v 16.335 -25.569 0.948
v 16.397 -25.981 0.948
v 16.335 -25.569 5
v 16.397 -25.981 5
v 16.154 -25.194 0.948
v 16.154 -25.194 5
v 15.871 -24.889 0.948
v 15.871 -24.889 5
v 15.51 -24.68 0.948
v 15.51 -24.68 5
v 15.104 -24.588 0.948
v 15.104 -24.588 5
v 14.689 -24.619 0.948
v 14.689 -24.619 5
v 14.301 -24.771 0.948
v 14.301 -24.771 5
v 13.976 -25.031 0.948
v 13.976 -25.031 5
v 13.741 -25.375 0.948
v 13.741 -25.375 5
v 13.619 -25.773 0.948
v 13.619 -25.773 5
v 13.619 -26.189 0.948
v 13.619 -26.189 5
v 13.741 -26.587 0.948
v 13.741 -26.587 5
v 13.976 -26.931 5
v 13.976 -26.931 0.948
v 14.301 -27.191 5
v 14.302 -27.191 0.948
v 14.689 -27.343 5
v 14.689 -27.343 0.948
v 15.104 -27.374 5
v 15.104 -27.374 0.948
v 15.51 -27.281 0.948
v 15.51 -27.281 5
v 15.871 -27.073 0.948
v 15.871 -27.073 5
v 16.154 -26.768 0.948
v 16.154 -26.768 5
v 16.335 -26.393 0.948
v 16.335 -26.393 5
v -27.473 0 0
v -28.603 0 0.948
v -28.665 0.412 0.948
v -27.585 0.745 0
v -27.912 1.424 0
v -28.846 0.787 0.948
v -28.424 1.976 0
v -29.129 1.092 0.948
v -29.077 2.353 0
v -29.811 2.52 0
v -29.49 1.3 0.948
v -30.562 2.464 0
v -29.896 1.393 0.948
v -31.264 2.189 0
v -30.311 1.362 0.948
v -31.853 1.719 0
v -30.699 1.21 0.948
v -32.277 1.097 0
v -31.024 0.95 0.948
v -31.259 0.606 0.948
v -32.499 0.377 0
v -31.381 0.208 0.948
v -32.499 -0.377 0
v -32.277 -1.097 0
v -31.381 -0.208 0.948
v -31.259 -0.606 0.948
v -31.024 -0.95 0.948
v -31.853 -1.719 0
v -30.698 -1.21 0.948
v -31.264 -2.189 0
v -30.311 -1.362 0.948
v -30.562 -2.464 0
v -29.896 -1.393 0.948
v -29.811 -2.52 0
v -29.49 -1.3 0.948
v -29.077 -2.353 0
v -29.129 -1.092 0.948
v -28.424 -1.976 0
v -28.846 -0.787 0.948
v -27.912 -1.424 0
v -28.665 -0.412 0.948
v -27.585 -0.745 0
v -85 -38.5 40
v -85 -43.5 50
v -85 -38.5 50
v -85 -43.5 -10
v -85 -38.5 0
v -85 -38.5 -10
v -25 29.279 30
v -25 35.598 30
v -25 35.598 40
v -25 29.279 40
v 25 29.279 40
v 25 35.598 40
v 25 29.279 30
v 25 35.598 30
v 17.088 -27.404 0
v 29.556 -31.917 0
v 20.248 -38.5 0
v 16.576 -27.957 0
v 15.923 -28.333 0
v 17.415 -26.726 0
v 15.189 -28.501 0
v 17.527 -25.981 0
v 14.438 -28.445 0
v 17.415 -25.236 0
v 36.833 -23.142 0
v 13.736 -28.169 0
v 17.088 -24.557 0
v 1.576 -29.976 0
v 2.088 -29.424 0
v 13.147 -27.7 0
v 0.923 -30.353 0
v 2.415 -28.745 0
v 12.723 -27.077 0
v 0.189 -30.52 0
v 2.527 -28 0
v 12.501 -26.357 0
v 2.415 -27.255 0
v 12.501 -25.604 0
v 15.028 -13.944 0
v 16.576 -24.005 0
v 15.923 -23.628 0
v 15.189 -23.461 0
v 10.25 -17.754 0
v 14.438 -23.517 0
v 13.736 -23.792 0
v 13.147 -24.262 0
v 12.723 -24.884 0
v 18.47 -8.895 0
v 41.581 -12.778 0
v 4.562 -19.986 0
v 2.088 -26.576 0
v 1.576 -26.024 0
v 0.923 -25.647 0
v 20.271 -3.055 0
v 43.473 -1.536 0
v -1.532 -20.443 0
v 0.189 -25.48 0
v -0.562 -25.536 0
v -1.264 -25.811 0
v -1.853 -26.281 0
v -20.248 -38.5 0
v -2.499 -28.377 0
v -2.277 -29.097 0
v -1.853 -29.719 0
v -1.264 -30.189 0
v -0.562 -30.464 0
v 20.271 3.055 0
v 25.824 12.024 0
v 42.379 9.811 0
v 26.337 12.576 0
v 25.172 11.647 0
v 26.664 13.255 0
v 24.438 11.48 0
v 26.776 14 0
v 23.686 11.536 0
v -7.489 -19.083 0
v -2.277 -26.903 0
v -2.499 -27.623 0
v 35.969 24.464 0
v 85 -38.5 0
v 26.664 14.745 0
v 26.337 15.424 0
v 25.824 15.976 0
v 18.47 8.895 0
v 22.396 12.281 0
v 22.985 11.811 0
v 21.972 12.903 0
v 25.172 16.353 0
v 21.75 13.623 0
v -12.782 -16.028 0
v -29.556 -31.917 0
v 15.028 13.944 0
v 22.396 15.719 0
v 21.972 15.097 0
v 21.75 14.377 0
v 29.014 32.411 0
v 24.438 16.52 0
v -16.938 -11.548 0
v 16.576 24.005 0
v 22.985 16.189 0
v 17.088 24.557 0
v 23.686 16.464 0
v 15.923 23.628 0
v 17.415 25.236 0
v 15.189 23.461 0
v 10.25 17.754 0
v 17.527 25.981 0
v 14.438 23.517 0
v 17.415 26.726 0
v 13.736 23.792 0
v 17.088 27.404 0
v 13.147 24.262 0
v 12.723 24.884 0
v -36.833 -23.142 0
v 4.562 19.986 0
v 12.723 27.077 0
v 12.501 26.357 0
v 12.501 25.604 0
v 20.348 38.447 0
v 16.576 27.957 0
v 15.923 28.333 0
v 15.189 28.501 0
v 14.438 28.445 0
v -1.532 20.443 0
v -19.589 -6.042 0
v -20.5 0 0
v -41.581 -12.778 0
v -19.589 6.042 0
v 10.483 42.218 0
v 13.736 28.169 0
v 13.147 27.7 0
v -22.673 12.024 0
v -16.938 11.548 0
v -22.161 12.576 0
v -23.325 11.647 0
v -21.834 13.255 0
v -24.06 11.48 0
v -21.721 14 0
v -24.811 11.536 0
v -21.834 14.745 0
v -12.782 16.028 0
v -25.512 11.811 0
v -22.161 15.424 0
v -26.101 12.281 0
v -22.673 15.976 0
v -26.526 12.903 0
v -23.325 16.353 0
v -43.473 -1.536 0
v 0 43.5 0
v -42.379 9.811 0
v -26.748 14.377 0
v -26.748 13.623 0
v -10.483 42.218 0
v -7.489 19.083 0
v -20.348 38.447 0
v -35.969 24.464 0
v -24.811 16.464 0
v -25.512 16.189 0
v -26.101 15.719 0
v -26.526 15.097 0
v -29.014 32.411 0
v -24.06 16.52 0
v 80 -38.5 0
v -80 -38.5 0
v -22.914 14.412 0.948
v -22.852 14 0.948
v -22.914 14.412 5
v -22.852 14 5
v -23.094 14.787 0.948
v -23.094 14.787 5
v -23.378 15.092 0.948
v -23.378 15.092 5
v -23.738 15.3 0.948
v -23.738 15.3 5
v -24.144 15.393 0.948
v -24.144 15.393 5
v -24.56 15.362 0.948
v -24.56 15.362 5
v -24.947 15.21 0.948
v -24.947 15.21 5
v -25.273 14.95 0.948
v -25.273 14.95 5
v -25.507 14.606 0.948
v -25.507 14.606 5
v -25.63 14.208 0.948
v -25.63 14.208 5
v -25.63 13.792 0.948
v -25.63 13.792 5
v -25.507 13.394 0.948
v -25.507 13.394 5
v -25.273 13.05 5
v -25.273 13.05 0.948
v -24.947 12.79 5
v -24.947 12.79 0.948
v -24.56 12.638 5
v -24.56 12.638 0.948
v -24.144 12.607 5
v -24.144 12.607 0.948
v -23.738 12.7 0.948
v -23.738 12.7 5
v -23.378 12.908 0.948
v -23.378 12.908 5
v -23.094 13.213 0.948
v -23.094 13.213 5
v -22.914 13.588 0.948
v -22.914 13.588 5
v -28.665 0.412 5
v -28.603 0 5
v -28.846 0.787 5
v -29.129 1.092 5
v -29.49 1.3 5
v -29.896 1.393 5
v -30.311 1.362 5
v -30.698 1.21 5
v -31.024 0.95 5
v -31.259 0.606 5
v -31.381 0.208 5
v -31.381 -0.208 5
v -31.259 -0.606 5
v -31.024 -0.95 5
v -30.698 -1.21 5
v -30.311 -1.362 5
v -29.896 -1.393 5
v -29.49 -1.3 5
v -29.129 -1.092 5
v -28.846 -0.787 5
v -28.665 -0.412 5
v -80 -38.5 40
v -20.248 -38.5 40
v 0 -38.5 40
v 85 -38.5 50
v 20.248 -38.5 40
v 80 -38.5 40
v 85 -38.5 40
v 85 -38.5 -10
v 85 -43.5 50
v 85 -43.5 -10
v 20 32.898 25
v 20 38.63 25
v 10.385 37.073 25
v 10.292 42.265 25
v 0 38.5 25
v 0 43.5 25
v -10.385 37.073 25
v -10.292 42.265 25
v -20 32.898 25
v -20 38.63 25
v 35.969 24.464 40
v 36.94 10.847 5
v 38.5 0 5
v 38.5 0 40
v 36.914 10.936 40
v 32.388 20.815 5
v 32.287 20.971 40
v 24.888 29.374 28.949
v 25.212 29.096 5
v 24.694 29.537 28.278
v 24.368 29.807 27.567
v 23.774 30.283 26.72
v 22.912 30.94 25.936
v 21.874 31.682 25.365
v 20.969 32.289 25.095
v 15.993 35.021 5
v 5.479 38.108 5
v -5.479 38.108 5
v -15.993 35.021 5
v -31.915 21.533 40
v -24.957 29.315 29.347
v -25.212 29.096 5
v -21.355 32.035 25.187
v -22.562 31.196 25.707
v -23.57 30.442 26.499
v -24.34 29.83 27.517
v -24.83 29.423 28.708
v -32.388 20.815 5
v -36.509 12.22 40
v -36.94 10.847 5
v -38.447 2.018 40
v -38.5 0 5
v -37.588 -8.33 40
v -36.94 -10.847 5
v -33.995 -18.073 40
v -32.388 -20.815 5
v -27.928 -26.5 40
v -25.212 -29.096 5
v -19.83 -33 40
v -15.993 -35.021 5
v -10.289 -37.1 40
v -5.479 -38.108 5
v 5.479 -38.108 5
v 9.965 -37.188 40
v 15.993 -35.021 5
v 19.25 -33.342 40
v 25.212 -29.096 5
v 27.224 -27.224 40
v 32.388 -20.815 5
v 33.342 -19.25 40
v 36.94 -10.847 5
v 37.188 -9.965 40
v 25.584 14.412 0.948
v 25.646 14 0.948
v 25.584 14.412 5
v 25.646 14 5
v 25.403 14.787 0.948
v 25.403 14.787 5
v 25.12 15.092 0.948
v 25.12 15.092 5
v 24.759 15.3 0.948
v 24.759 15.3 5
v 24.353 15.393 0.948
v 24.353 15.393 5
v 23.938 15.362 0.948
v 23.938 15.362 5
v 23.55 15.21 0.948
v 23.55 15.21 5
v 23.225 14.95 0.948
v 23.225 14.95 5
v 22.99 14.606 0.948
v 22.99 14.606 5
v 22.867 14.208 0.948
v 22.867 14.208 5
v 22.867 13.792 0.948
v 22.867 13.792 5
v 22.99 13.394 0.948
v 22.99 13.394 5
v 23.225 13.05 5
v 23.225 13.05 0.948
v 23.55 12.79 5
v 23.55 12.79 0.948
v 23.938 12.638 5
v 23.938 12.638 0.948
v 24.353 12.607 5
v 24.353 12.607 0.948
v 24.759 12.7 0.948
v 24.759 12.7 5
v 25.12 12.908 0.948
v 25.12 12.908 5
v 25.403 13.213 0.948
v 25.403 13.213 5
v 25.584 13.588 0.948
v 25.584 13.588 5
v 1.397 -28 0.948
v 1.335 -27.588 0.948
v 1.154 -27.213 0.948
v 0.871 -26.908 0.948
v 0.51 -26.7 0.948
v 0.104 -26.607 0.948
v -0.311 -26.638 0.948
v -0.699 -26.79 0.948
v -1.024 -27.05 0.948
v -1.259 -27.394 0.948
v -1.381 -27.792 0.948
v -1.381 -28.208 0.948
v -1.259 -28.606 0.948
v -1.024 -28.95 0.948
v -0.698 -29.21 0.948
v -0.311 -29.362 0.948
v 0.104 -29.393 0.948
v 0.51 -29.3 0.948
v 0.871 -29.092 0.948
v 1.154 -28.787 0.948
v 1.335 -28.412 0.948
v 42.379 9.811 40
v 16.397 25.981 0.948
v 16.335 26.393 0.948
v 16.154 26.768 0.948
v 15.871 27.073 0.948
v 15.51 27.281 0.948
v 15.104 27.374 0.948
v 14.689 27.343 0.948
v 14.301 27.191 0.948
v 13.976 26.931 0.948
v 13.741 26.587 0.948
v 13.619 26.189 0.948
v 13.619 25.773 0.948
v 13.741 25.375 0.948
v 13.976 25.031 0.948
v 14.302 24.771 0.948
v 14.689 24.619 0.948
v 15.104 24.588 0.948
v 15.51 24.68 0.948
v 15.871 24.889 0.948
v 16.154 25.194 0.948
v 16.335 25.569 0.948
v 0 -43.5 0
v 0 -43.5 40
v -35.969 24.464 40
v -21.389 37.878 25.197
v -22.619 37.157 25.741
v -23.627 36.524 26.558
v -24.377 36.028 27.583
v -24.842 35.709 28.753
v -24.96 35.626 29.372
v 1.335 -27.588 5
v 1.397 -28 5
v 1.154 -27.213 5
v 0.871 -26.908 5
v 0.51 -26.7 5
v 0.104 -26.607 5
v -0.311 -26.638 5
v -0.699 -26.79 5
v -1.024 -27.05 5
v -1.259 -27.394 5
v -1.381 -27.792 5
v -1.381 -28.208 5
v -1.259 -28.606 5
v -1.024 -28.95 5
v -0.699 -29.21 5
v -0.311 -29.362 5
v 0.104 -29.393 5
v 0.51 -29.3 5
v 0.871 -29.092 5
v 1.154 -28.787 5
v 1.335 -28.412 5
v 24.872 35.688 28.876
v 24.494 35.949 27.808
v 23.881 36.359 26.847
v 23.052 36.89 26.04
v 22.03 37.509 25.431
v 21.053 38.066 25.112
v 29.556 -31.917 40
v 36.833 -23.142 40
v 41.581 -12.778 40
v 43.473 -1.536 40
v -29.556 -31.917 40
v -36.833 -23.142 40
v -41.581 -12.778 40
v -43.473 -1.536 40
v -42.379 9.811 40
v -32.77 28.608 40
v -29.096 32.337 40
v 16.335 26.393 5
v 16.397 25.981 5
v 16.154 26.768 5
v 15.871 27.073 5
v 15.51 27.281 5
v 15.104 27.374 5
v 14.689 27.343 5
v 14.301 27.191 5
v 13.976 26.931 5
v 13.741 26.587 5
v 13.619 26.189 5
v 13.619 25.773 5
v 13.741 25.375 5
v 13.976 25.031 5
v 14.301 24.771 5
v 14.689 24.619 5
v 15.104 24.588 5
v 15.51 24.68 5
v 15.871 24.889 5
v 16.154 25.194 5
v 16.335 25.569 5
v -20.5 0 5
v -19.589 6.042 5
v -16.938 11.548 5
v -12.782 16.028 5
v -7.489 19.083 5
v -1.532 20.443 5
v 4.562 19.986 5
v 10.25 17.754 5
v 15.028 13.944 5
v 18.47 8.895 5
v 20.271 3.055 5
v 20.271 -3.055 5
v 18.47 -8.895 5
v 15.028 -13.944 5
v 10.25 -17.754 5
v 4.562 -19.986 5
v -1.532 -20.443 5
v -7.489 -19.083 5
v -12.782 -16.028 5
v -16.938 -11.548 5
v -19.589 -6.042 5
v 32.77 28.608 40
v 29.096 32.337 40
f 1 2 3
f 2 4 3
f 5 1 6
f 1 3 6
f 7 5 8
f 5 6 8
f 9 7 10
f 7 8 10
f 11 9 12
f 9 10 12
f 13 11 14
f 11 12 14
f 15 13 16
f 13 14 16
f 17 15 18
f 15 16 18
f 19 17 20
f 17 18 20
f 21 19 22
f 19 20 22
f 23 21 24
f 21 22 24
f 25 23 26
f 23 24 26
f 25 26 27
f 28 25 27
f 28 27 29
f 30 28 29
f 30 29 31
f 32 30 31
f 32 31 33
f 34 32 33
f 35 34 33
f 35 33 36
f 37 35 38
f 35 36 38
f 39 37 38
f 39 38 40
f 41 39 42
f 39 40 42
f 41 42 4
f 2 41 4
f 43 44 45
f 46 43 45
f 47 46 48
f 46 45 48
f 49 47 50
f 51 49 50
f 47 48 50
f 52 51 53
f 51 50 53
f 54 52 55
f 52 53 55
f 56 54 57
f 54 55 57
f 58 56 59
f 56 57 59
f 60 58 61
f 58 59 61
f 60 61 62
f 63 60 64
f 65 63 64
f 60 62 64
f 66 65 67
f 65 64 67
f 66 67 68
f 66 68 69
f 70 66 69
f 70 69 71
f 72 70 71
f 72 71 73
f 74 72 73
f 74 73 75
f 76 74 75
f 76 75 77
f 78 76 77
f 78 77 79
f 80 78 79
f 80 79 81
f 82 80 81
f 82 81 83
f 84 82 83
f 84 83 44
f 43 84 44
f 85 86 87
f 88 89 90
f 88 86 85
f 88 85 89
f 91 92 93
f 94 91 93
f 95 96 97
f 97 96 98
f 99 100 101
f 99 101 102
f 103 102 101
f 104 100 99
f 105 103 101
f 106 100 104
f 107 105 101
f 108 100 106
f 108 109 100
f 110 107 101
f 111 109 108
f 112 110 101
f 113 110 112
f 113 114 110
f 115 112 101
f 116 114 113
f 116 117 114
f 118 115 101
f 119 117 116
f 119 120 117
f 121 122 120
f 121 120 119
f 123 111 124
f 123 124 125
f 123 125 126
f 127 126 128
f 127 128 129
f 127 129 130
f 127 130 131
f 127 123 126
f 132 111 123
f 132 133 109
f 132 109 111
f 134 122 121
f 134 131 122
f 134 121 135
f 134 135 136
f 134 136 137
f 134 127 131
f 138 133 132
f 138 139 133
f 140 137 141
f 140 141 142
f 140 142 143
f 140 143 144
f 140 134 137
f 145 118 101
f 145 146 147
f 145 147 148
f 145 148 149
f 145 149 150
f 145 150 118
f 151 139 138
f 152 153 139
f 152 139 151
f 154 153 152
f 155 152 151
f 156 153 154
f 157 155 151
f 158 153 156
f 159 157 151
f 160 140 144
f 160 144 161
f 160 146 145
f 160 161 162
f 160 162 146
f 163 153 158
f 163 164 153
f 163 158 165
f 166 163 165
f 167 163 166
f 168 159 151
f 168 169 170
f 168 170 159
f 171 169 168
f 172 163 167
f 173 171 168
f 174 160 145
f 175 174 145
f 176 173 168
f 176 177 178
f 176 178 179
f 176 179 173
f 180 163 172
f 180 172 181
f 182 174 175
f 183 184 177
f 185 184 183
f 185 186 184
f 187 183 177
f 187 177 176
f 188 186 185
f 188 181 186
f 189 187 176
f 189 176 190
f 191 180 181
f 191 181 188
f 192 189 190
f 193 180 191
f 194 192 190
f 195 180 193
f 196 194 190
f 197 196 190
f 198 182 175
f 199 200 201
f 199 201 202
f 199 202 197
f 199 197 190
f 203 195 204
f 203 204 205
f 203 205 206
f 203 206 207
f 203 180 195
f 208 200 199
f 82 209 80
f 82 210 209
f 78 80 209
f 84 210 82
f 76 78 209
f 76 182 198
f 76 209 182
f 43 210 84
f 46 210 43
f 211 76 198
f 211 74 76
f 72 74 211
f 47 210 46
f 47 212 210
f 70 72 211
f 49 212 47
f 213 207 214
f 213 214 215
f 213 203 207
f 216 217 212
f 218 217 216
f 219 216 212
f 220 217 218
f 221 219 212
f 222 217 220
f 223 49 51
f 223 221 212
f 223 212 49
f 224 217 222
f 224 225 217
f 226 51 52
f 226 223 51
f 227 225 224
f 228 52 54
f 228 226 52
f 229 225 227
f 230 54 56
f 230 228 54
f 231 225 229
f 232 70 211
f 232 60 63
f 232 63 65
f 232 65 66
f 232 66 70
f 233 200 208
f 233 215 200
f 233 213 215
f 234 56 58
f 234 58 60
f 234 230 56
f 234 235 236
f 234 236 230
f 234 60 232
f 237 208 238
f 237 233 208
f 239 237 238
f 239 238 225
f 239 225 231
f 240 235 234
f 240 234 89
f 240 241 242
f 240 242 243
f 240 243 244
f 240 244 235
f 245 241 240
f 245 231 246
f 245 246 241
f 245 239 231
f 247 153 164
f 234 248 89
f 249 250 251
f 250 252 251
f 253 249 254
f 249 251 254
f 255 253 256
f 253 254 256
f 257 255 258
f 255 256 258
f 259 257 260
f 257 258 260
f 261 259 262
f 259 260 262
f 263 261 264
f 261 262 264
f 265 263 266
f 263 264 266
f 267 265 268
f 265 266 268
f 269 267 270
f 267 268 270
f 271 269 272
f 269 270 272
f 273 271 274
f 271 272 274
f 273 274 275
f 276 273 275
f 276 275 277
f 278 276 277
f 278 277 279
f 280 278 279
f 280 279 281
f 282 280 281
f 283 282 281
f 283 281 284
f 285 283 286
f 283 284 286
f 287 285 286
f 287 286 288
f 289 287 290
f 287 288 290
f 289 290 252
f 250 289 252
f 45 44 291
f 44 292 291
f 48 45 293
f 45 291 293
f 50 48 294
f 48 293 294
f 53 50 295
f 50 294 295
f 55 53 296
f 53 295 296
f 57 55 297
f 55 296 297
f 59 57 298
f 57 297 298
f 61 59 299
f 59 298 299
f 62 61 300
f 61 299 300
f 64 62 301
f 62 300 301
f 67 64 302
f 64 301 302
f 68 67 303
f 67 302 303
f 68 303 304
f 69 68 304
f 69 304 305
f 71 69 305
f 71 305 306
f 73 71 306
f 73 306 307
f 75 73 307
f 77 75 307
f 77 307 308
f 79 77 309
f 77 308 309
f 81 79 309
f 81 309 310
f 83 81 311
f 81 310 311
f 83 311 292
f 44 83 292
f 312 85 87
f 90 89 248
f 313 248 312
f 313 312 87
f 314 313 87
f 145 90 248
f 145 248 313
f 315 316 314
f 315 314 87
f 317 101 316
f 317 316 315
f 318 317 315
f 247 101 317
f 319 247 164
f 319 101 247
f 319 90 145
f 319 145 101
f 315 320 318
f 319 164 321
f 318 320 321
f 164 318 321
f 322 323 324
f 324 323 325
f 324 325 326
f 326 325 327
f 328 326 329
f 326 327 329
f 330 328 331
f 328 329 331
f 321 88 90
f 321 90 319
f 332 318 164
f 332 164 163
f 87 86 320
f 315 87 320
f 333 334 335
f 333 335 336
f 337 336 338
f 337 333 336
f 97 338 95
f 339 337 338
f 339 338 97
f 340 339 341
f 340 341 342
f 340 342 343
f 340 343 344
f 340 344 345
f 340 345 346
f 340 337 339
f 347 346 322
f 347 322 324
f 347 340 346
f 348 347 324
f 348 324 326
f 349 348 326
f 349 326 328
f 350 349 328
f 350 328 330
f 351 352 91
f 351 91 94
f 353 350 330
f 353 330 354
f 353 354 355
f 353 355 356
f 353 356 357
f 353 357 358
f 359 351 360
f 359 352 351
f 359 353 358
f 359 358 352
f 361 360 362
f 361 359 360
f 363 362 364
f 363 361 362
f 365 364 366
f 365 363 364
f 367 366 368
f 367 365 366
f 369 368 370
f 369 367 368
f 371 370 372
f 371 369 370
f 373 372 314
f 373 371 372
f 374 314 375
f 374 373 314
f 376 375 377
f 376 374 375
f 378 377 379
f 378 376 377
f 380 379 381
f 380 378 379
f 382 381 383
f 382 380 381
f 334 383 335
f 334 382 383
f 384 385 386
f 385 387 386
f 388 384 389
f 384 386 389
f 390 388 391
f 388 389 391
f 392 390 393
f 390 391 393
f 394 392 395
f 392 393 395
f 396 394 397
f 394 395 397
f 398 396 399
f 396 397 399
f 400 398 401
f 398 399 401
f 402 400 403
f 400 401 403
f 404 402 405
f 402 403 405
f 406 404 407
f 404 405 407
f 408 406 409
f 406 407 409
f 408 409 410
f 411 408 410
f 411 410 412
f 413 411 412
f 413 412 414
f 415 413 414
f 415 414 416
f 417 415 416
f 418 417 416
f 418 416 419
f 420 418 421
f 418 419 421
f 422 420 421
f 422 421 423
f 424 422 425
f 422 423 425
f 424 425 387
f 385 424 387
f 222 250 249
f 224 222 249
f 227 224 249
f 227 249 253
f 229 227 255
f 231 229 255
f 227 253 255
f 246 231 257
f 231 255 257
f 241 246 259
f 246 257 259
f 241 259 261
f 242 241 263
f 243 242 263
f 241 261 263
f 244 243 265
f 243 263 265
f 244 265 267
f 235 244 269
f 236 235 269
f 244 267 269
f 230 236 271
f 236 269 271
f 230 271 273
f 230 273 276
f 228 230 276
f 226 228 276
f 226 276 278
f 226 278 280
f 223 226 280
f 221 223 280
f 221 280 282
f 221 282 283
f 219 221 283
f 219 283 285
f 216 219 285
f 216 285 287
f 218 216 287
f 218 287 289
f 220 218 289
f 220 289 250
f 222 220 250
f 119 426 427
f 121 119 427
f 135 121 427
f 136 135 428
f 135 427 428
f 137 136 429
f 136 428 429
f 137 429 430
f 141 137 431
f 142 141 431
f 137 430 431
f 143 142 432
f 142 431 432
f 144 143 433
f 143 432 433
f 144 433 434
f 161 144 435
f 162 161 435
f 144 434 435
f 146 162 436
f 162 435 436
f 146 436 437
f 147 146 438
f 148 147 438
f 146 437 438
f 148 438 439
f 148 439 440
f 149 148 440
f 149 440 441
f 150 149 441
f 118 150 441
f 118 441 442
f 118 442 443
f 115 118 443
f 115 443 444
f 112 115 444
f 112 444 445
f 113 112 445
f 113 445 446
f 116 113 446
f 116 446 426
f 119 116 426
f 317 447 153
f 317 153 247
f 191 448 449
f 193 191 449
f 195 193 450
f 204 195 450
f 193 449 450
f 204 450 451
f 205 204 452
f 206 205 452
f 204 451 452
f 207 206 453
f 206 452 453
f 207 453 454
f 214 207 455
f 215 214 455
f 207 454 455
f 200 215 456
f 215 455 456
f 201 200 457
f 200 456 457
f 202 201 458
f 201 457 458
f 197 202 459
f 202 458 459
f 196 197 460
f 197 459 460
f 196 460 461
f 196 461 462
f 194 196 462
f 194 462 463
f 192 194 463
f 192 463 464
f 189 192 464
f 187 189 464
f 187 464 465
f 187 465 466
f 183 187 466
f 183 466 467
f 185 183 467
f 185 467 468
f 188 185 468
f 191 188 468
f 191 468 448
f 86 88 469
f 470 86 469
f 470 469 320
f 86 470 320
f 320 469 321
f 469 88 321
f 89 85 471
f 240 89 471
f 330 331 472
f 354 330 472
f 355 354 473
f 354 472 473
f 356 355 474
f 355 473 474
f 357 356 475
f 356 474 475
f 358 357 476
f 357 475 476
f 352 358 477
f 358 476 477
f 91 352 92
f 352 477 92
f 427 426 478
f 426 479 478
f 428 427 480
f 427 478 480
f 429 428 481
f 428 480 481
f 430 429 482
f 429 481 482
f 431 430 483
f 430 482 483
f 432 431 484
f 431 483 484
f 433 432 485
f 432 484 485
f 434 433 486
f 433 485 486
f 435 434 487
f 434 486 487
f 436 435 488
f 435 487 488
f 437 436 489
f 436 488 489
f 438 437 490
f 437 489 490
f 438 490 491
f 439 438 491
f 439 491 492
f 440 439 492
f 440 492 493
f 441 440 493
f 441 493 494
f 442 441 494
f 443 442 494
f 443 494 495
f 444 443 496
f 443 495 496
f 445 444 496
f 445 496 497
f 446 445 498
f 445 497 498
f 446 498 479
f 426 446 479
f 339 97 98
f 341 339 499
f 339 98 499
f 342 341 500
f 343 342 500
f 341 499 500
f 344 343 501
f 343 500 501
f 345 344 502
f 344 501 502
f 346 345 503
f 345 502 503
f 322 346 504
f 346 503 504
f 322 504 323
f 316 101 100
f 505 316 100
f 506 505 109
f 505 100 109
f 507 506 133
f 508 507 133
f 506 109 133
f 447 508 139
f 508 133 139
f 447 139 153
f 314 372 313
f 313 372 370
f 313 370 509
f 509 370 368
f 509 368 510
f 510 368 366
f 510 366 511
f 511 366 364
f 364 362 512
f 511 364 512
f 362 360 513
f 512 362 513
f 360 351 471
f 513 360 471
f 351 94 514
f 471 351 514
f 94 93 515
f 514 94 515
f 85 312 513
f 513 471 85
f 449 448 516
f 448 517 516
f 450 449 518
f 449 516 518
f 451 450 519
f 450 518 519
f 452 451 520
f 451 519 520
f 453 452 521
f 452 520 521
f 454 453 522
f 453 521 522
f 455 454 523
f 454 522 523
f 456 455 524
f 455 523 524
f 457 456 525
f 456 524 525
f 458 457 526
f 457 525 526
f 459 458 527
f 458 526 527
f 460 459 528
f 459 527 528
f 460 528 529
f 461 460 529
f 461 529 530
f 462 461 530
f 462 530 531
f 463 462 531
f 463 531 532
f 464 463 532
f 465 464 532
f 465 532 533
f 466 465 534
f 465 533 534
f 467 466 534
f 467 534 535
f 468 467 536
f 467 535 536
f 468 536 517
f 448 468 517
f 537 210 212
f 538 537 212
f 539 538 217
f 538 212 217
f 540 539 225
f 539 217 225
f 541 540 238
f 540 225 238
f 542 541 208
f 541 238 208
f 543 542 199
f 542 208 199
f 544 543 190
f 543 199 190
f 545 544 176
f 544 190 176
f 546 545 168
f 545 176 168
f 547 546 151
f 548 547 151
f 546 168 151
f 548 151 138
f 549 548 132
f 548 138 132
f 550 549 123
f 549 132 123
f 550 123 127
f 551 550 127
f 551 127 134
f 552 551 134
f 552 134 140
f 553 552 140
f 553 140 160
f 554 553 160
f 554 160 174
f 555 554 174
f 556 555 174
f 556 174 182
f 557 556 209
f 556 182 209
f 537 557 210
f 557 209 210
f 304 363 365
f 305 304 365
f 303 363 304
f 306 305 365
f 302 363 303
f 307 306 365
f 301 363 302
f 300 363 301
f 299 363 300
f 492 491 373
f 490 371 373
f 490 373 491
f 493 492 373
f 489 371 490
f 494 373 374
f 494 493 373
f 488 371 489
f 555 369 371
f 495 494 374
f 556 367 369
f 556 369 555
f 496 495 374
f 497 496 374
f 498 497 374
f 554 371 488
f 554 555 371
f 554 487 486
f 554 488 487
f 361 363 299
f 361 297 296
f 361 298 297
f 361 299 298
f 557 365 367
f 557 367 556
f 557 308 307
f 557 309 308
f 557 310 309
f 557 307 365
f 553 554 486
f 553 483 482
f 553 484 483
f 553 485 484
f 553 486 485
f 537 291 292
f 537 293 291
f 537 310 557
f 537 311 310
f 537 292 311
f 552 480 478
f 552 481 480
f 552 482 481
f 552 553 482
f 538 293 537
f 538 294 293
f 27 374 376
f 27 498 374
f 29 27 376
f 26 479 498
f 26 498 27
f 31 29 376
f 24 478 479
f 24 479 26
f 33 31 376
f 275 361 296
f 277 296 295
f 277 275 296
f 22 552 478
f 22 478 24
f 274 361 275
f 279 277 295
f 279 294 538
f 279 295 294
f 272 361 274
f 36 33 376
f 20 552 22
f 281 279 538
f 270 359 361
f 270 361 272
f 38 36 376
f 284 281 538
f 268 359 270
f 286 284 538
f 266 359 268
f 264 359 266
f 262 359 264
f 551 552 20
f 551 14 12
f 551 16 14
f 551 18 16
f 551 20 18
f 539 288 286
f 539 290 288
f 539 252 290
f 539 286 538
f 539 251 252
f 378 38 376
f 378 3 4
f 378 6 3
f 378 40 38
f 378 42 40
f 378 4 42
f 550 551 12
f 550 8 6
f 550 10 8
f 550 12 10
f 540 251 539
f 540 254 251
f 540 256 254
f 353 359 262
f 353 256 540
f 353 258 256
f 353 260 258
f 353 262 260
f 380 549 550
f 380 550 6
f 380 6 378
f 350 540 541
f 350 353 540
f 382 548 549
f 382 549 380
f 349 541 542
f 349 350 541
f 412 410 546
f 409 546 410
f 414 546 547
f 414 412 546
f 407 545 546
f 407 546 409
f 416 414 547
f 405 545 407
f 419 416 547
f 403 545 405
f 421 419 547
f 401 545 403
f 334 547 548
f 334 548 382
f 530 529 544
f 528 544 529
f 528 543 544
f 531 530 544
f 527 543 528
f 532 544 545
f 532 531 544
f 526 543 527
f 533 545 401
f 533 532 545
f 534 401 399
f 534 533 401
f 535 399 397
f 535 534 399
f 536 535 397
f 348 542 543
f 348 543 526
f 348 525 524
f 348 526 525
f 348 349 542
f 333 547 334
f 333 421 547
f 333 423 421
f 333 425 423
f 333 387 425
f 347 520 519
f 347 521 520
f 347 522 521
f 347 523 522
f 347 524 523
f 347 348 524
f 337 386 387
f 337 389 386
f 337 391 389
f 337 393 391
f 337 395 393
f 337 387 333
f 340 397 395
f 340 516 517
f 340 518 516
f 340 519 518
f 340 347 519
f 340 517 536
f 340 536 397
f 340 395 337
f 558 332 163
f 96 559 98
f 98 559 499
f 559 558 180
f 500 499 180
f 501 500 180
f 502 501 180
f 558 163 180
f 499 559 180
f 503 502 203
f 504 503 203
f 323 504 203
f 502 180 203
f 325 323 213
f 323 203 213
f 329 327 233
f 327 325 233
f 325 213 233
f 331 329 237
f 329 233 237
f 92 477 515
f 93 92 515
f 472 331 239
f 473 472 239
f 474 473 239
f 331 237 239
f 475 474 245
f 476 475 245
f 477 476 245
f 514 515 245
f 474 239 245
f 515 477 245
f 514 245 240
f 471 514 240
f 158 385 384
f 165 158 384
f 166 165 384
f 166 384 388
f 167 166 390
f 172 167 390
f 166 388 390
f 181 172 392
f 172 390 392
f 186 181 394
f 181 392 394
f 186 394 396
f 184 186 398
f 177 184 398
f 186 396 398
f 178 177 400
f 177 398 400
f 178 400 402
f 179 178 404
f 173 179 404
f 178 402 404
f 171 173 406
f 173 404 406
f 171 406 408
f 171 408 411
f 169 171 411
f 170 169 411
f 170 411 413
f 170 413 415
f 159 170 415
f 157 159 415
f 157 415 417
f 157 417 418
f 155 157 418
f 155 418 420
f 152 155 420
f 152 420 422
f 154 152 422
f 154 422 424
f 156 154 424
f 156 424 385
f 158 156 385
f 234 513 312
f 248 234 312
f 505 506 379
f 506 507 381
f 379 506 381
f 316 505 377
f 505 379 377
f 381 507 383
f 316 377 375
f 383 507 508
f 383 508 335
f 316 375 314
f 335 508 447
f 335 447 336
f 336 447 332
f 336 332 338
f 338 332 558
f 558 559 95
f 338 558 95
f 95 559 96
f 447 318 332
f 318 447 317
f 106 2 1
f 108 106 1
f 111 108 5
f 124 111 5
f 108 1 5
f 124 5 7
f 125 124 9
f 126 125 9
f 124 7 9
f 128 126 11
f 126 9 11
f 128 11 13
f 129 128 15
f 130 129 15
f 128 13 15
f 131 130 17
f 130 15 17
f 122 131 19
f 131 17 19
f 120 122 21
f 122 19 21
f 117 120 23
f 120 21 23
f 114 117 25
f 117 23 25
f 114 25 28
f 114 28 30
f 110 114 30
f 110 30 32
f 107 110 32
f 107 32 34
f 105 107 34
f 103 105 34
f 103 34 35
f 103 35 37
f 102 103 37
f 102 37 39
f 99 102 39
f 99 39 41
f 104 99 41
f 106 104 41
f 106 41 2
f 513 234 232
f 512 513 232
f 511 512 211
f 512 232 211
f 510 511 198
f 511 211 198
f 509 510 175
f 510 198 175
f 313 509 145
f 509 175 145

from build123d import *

# Parameters (mm, degrees)
SKETCH17_R                                        = 43.5
BOSS_EXTRUDE1_DEPTH                               = 5
SKETCH19_R                                        = 43.5
SKETCH19_R_2                                      = 38.5
BOSS_EXTRUDE2_DEPTH                               = 35
SKETCH20_R                                        = 20.5
CUT_EXTRUDE1_DEPTH                                = 5
SKETCH26_W                                        = 170
SKETCH26_H                                        = 60
BOSS_EXTRUDE3_DEPTH                               = 5
BOSS_EXTRUDE4_DEPTH                               = 40
CSK_FOR_3_FLAT_HEAD_MACHINE_SCREW_100_D           = 2.794
CSK_FOR_3_FLAT_HEAD_MACHINE_SCREW_100_CSINK_D     = 5.0546
CSK_FOR_3_FLAT_HEAD_MACHINE_SCREW_100_CSINK_ANGLE = 100
CUT_EXTRUDE2_DEPTH                                = 40


with BuildPart() as part:
    # Sketch17 → Boss-Extrude1 (new body)
    with BuildSketch(Plane.XY):
        Circle(SKETCH17_R)
    extrude(amount=BOSS_EXTRUDE1_DEPTH)

    # Sketch19 → Boss-Extrude2 (add)
    with BuildSketch(Plane.XY.offset(5)):
        Circle(SKETCH19_R)
        Circle(SKETCH19_R_2, mode=Mode.SUBTRACT)
    extrude(amount=BOSS_EXTRUDE2_DEPTH)

    # Sketch20 → Cut-Extrude1 (cut)
    with BuildSketch(Plane(origin=(0, 0, 0), x_dir=(-1, 0, 0), z_dir=(0, 0, -1))):
        Circle(SKETCH20_R)
    extrude(amount=-CUT_EXTRUDE1_DEPTH, mode=Mode.SUBTRACT)

    # Sketch26 → Boss-Extrude3 (add)
    with BuildSketch(Plane(origin=(0, -43.5, 0), x_dir=(1, 0, 0), z_dir=(0, 1, 0))):
        with Locations((0, -20)):
            Rectangle(SKETCH26_W, SKETCH26_H)
    extrude(amount=BOSS_EXTRUDE3_DEPTH)

    # Sketch27 → Boss-Extrude4 (add)
    with BuildSketch(Plane.XY.offset(40)):
        Polygon((-85, -38.5), (-32.53104334, 28.878732991), (-42.379072789, 9.811431574), (-80, -38.5), align=None)
        Polygon((32.53104334, 28.878732991), (42.379072789, 9.811431574), (80, -38.5), (85, -38.5), align=None)
    extrude(amount=-BOSS_EXTRUDE4_DEPTH)

    # CSK for #3 Flat Head Machine Screw (100)4 (through all)
    with Locations(Plane(origin=(0, 0, 0), x_dir=(-1, 0, 0), z_dir=(0, 0, -1))):
        with Locations((-24.248711306, 14), (-15, 25.980762114), (24.248711306, 14), (30, 0), (0, -28), (-15, -25.980762114)):
            CounterSinkHole(CSK_FOR_3_FLAT_HEAD_MACHINE_SCREW_100_D / 2, CSK_FOR_3_FLAT_HEAD_MACHINE_SCREW_100_CSINK_D / 2, counter_sink_angle=CSK_FOR_3_FLAT_HEAD_MACHINE_SCREW_100_CSINK_ANGLE)

    # Sketch34 → Cut-Extrude2 (cut)
    with BuildSketch(Plane(origin=(0, 43.5, 0), x_dir=(1, 0, 0), z_dir=(0, 1, 0))):
        with BuildLine():
            Line((-25, -40), (25, -40))
            Line((25, -40), (25, -30))
            ThreePointArc((25, -30), (23.535533906, -26.464466094), (20, -25))
            Line((20, -25), (-20, -25))
            ThreePointArc((-20, -25), (-23.535533906, -26.464466094), (-25, -30))
            Line((-25, -30), (-25, -40))
        make_face()
    extrude(amount=-CUT_EXTRUDE2_DEPTH, mode=Mode.SUBTRACT)


solid = part.part
